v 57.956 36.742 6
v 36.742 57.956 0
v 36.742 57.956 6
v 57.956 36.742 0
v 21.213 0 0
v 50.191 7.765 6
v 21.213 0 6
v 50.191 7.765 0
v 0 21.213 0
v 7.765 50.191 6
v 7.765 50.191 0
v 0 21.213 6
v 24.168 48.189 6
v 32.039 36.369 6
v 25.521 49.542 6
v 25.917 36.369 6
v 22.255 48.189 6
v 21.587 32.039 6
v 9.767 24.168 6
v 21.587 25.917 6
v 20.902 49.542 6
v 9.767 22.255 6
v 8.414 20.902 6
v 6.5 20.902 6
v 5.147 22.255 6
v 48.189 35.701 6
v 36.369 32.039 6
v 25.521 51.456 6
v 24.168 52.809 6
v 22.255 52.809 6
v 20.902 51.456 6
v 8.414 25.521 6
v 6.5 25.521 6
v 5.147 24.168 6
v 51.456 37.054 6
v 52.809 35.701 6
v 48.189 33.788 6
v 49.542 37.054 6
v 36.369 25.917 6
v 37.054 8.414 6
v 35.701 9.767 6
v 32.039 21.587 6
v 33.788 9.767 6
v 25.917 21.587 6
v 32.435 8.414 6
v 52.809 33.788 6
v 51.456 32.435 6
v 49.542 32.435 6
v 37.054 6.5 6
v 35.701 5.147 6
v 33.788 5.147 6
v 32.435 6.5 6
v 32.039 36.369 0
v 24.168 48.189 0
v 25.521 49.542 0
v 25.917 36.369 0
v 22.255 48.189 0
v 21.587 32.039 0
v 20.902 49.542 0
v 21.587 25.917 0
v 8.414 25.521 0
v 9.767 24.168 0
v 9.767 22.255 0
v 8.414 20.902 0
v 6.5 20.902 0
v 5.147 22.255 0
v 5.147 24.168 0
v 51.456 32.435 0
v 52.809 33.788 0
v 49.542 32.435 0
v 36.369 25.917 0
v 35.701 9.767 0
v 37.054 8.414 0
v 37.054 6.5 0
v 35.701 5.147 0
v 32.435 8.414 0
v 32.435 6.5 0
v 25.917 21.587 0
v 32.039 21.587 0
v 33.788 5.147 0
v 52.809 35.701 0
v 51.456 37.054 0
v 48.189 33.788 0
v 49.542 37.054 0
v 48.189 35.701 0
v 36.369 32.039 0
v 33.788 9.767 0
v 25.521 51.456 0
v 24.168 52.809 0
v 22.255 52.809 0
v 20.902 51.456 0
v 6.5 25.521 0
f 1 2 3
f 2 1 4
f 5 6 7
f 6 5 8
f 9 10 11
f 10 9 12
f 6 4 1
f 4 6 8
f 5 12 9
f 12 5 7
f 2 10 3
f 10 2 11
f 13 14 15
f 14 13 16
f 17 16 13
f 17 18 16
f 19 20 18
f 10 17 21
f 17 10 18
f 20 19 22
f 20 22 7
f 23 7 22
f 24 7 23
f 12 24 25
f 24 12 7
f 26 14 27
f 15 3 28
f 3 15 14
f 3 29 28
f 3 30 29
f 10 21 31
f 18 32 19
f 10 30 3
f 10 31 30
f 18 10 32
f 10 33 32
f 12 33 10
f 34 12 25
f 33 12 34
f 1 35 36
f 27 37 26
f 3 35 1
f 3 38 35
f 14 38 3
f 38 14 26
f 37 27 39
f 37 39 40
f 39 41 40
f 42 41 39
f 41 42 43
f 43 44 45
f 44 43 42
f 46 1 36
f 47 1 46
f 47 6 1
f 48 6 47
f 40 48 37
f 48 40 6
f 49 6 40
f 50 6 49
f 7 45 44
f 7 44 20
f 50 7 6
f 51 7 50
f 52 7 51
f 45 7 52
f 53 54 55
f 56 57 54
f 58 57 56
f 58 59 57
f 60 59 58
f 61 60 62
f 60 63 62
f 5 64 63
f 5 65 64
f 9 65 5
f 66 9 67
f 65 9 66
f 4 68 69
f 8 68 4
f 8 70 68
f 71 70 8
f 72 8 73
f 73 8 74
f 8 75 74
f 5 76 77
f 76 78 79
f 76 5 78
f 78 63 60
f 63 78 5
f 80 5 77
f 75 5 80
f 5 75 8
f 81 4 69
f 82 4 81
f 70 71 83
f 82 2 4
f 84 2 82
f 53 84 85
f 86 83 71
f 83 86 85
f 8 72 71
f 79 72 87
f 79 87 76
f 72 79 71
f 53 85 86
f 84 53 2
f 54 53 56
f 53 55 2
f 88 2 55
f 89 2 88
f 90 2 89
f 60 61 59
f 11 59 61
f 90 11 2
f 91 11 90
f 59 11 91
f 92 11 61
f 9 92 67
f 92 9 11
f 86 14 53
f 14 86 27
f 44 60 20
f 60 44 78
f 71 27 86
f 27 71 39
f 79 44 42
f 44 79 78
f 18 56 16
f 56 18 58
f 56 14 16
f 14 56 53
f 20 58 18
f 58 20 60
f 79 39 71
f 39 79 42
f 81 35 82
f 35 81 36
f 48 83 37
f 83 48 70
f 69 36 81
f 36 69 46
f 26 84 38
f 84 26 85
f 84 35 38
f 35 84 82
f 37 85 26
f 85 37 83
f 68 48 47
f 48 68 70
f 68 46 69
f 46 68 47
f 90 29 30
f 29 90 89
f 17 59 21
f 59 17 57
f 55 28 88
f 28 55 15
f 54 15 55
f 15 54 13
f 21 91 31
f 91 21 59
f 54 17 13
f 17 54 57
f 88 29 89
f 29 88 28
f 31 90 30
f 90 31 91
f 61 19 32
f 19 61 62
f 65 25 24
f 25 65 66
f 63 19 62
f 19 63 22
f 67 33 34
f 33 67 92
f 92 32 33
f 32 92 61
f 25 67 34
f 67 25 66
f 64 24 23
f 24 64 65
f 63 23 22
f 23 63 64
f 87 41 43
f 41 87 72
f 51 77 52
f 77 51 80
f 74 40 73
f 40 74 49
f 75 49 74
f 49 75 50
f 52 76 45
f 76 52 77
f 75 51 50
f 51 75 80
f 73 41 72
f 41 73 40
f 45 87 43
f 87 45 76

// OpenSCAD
$fn = 32;

// ----------------------------------------------------------------------
// Polygon plate: 6-gon R30, 4 bolt windows
// ----------------------------------------------------------------------

// --- parameters (mm) ---
sides = 6;                // number of polygon sides
plate_r = 30;             // circumscribed radius of the polygon
bore_r = 8;               // centre bore radius
bolts = 4;                // number of bolt windows
ring_r = 22.28;           // bolt-circle radius
bolt_r = 2.5;             // bolt window radius
plate_t = 6;              // plate thickness, Z (extrusion height)

plate_d = 2 * plate_r;  // circumscribed diameter
bore_d = 2 * bore_r;  // centre bore diameter
bolt_d = 2 * bolt_r;  // bolt window diameter
ring_d = 2 * ring_r;  // bolt-circle diameter

profile = [[57.956, 36.742], [36.742, 57.956], [7.765, 50.191], [0, 21.213], [21.213, 0], [50.191, 7.765]];  // primary outline, 6 points, counter clockwise
void_1 = [[36.369, 32.039], [32.039, 36.369], [25.917, 36.369], [21.587, 32.039], [21.587, 25.917], [25.917, 21.587], [32.039, 21.587], [36.369, 25.917]];  // centre bore, 8 points
void_2 = [[52.809, 35.701], [51.456, 37.054], [49.542, 37.054], [48.189, 35.701], [48.189, 33.788], [49.542, 32.435], [51.456, 32.435], [52.809, 33.788]];  // bolt window 1, 8 points
void_3 = [[25.521, 51.456], [24.168, 52.809], [22.255, 52.809], [20.902, 51.456], [20.902, 49.542], [22.255, 48.189], [24.168, 48.189], [25.521, 49.542]];  // bolt window 2, 8 points
void_4 = [[9.767, 24.168], [8.414, 25.521], [6.5, 25.521], [5.147, 24.168], [5.147, 22.255], [6.5, 20.902], [8.414, 20.902], [9.767, 22.255]];  // bolt window 3, 8 points
void_5 = [[37.054, 8.414], [35.701, 9.767], [33.788, 9.767], [32.435, 8.414], [32.435, 6.5], [33.788, 5.147], [35.701, 5.147], [37.054, 6.5]];  // bolt window 4, 8 points

// --- the one profile operation ---
difference() {
  linear_extrude(height = plate_t) polygon(points = profile);
  translate([0, 0, -1])
    linear_extrude(height = plate_t + 2) polygon(points = void_1);
  translate([0, 0, -1])
    linear_extrude(height = plate_t + 2) polygon(points = void_2);
  translate([0, 0, -1])
    linear_extrude(height = plate_t + 2) polygon(points = void_3);
  translate([0, 0, -1])
    linear_extrude(height = plate_t + 2) polygon(points = void_4);
  translate([0, 0, -1])
    linear_extrude(height = plate_t + 2) polygon(points = void_5);
}
